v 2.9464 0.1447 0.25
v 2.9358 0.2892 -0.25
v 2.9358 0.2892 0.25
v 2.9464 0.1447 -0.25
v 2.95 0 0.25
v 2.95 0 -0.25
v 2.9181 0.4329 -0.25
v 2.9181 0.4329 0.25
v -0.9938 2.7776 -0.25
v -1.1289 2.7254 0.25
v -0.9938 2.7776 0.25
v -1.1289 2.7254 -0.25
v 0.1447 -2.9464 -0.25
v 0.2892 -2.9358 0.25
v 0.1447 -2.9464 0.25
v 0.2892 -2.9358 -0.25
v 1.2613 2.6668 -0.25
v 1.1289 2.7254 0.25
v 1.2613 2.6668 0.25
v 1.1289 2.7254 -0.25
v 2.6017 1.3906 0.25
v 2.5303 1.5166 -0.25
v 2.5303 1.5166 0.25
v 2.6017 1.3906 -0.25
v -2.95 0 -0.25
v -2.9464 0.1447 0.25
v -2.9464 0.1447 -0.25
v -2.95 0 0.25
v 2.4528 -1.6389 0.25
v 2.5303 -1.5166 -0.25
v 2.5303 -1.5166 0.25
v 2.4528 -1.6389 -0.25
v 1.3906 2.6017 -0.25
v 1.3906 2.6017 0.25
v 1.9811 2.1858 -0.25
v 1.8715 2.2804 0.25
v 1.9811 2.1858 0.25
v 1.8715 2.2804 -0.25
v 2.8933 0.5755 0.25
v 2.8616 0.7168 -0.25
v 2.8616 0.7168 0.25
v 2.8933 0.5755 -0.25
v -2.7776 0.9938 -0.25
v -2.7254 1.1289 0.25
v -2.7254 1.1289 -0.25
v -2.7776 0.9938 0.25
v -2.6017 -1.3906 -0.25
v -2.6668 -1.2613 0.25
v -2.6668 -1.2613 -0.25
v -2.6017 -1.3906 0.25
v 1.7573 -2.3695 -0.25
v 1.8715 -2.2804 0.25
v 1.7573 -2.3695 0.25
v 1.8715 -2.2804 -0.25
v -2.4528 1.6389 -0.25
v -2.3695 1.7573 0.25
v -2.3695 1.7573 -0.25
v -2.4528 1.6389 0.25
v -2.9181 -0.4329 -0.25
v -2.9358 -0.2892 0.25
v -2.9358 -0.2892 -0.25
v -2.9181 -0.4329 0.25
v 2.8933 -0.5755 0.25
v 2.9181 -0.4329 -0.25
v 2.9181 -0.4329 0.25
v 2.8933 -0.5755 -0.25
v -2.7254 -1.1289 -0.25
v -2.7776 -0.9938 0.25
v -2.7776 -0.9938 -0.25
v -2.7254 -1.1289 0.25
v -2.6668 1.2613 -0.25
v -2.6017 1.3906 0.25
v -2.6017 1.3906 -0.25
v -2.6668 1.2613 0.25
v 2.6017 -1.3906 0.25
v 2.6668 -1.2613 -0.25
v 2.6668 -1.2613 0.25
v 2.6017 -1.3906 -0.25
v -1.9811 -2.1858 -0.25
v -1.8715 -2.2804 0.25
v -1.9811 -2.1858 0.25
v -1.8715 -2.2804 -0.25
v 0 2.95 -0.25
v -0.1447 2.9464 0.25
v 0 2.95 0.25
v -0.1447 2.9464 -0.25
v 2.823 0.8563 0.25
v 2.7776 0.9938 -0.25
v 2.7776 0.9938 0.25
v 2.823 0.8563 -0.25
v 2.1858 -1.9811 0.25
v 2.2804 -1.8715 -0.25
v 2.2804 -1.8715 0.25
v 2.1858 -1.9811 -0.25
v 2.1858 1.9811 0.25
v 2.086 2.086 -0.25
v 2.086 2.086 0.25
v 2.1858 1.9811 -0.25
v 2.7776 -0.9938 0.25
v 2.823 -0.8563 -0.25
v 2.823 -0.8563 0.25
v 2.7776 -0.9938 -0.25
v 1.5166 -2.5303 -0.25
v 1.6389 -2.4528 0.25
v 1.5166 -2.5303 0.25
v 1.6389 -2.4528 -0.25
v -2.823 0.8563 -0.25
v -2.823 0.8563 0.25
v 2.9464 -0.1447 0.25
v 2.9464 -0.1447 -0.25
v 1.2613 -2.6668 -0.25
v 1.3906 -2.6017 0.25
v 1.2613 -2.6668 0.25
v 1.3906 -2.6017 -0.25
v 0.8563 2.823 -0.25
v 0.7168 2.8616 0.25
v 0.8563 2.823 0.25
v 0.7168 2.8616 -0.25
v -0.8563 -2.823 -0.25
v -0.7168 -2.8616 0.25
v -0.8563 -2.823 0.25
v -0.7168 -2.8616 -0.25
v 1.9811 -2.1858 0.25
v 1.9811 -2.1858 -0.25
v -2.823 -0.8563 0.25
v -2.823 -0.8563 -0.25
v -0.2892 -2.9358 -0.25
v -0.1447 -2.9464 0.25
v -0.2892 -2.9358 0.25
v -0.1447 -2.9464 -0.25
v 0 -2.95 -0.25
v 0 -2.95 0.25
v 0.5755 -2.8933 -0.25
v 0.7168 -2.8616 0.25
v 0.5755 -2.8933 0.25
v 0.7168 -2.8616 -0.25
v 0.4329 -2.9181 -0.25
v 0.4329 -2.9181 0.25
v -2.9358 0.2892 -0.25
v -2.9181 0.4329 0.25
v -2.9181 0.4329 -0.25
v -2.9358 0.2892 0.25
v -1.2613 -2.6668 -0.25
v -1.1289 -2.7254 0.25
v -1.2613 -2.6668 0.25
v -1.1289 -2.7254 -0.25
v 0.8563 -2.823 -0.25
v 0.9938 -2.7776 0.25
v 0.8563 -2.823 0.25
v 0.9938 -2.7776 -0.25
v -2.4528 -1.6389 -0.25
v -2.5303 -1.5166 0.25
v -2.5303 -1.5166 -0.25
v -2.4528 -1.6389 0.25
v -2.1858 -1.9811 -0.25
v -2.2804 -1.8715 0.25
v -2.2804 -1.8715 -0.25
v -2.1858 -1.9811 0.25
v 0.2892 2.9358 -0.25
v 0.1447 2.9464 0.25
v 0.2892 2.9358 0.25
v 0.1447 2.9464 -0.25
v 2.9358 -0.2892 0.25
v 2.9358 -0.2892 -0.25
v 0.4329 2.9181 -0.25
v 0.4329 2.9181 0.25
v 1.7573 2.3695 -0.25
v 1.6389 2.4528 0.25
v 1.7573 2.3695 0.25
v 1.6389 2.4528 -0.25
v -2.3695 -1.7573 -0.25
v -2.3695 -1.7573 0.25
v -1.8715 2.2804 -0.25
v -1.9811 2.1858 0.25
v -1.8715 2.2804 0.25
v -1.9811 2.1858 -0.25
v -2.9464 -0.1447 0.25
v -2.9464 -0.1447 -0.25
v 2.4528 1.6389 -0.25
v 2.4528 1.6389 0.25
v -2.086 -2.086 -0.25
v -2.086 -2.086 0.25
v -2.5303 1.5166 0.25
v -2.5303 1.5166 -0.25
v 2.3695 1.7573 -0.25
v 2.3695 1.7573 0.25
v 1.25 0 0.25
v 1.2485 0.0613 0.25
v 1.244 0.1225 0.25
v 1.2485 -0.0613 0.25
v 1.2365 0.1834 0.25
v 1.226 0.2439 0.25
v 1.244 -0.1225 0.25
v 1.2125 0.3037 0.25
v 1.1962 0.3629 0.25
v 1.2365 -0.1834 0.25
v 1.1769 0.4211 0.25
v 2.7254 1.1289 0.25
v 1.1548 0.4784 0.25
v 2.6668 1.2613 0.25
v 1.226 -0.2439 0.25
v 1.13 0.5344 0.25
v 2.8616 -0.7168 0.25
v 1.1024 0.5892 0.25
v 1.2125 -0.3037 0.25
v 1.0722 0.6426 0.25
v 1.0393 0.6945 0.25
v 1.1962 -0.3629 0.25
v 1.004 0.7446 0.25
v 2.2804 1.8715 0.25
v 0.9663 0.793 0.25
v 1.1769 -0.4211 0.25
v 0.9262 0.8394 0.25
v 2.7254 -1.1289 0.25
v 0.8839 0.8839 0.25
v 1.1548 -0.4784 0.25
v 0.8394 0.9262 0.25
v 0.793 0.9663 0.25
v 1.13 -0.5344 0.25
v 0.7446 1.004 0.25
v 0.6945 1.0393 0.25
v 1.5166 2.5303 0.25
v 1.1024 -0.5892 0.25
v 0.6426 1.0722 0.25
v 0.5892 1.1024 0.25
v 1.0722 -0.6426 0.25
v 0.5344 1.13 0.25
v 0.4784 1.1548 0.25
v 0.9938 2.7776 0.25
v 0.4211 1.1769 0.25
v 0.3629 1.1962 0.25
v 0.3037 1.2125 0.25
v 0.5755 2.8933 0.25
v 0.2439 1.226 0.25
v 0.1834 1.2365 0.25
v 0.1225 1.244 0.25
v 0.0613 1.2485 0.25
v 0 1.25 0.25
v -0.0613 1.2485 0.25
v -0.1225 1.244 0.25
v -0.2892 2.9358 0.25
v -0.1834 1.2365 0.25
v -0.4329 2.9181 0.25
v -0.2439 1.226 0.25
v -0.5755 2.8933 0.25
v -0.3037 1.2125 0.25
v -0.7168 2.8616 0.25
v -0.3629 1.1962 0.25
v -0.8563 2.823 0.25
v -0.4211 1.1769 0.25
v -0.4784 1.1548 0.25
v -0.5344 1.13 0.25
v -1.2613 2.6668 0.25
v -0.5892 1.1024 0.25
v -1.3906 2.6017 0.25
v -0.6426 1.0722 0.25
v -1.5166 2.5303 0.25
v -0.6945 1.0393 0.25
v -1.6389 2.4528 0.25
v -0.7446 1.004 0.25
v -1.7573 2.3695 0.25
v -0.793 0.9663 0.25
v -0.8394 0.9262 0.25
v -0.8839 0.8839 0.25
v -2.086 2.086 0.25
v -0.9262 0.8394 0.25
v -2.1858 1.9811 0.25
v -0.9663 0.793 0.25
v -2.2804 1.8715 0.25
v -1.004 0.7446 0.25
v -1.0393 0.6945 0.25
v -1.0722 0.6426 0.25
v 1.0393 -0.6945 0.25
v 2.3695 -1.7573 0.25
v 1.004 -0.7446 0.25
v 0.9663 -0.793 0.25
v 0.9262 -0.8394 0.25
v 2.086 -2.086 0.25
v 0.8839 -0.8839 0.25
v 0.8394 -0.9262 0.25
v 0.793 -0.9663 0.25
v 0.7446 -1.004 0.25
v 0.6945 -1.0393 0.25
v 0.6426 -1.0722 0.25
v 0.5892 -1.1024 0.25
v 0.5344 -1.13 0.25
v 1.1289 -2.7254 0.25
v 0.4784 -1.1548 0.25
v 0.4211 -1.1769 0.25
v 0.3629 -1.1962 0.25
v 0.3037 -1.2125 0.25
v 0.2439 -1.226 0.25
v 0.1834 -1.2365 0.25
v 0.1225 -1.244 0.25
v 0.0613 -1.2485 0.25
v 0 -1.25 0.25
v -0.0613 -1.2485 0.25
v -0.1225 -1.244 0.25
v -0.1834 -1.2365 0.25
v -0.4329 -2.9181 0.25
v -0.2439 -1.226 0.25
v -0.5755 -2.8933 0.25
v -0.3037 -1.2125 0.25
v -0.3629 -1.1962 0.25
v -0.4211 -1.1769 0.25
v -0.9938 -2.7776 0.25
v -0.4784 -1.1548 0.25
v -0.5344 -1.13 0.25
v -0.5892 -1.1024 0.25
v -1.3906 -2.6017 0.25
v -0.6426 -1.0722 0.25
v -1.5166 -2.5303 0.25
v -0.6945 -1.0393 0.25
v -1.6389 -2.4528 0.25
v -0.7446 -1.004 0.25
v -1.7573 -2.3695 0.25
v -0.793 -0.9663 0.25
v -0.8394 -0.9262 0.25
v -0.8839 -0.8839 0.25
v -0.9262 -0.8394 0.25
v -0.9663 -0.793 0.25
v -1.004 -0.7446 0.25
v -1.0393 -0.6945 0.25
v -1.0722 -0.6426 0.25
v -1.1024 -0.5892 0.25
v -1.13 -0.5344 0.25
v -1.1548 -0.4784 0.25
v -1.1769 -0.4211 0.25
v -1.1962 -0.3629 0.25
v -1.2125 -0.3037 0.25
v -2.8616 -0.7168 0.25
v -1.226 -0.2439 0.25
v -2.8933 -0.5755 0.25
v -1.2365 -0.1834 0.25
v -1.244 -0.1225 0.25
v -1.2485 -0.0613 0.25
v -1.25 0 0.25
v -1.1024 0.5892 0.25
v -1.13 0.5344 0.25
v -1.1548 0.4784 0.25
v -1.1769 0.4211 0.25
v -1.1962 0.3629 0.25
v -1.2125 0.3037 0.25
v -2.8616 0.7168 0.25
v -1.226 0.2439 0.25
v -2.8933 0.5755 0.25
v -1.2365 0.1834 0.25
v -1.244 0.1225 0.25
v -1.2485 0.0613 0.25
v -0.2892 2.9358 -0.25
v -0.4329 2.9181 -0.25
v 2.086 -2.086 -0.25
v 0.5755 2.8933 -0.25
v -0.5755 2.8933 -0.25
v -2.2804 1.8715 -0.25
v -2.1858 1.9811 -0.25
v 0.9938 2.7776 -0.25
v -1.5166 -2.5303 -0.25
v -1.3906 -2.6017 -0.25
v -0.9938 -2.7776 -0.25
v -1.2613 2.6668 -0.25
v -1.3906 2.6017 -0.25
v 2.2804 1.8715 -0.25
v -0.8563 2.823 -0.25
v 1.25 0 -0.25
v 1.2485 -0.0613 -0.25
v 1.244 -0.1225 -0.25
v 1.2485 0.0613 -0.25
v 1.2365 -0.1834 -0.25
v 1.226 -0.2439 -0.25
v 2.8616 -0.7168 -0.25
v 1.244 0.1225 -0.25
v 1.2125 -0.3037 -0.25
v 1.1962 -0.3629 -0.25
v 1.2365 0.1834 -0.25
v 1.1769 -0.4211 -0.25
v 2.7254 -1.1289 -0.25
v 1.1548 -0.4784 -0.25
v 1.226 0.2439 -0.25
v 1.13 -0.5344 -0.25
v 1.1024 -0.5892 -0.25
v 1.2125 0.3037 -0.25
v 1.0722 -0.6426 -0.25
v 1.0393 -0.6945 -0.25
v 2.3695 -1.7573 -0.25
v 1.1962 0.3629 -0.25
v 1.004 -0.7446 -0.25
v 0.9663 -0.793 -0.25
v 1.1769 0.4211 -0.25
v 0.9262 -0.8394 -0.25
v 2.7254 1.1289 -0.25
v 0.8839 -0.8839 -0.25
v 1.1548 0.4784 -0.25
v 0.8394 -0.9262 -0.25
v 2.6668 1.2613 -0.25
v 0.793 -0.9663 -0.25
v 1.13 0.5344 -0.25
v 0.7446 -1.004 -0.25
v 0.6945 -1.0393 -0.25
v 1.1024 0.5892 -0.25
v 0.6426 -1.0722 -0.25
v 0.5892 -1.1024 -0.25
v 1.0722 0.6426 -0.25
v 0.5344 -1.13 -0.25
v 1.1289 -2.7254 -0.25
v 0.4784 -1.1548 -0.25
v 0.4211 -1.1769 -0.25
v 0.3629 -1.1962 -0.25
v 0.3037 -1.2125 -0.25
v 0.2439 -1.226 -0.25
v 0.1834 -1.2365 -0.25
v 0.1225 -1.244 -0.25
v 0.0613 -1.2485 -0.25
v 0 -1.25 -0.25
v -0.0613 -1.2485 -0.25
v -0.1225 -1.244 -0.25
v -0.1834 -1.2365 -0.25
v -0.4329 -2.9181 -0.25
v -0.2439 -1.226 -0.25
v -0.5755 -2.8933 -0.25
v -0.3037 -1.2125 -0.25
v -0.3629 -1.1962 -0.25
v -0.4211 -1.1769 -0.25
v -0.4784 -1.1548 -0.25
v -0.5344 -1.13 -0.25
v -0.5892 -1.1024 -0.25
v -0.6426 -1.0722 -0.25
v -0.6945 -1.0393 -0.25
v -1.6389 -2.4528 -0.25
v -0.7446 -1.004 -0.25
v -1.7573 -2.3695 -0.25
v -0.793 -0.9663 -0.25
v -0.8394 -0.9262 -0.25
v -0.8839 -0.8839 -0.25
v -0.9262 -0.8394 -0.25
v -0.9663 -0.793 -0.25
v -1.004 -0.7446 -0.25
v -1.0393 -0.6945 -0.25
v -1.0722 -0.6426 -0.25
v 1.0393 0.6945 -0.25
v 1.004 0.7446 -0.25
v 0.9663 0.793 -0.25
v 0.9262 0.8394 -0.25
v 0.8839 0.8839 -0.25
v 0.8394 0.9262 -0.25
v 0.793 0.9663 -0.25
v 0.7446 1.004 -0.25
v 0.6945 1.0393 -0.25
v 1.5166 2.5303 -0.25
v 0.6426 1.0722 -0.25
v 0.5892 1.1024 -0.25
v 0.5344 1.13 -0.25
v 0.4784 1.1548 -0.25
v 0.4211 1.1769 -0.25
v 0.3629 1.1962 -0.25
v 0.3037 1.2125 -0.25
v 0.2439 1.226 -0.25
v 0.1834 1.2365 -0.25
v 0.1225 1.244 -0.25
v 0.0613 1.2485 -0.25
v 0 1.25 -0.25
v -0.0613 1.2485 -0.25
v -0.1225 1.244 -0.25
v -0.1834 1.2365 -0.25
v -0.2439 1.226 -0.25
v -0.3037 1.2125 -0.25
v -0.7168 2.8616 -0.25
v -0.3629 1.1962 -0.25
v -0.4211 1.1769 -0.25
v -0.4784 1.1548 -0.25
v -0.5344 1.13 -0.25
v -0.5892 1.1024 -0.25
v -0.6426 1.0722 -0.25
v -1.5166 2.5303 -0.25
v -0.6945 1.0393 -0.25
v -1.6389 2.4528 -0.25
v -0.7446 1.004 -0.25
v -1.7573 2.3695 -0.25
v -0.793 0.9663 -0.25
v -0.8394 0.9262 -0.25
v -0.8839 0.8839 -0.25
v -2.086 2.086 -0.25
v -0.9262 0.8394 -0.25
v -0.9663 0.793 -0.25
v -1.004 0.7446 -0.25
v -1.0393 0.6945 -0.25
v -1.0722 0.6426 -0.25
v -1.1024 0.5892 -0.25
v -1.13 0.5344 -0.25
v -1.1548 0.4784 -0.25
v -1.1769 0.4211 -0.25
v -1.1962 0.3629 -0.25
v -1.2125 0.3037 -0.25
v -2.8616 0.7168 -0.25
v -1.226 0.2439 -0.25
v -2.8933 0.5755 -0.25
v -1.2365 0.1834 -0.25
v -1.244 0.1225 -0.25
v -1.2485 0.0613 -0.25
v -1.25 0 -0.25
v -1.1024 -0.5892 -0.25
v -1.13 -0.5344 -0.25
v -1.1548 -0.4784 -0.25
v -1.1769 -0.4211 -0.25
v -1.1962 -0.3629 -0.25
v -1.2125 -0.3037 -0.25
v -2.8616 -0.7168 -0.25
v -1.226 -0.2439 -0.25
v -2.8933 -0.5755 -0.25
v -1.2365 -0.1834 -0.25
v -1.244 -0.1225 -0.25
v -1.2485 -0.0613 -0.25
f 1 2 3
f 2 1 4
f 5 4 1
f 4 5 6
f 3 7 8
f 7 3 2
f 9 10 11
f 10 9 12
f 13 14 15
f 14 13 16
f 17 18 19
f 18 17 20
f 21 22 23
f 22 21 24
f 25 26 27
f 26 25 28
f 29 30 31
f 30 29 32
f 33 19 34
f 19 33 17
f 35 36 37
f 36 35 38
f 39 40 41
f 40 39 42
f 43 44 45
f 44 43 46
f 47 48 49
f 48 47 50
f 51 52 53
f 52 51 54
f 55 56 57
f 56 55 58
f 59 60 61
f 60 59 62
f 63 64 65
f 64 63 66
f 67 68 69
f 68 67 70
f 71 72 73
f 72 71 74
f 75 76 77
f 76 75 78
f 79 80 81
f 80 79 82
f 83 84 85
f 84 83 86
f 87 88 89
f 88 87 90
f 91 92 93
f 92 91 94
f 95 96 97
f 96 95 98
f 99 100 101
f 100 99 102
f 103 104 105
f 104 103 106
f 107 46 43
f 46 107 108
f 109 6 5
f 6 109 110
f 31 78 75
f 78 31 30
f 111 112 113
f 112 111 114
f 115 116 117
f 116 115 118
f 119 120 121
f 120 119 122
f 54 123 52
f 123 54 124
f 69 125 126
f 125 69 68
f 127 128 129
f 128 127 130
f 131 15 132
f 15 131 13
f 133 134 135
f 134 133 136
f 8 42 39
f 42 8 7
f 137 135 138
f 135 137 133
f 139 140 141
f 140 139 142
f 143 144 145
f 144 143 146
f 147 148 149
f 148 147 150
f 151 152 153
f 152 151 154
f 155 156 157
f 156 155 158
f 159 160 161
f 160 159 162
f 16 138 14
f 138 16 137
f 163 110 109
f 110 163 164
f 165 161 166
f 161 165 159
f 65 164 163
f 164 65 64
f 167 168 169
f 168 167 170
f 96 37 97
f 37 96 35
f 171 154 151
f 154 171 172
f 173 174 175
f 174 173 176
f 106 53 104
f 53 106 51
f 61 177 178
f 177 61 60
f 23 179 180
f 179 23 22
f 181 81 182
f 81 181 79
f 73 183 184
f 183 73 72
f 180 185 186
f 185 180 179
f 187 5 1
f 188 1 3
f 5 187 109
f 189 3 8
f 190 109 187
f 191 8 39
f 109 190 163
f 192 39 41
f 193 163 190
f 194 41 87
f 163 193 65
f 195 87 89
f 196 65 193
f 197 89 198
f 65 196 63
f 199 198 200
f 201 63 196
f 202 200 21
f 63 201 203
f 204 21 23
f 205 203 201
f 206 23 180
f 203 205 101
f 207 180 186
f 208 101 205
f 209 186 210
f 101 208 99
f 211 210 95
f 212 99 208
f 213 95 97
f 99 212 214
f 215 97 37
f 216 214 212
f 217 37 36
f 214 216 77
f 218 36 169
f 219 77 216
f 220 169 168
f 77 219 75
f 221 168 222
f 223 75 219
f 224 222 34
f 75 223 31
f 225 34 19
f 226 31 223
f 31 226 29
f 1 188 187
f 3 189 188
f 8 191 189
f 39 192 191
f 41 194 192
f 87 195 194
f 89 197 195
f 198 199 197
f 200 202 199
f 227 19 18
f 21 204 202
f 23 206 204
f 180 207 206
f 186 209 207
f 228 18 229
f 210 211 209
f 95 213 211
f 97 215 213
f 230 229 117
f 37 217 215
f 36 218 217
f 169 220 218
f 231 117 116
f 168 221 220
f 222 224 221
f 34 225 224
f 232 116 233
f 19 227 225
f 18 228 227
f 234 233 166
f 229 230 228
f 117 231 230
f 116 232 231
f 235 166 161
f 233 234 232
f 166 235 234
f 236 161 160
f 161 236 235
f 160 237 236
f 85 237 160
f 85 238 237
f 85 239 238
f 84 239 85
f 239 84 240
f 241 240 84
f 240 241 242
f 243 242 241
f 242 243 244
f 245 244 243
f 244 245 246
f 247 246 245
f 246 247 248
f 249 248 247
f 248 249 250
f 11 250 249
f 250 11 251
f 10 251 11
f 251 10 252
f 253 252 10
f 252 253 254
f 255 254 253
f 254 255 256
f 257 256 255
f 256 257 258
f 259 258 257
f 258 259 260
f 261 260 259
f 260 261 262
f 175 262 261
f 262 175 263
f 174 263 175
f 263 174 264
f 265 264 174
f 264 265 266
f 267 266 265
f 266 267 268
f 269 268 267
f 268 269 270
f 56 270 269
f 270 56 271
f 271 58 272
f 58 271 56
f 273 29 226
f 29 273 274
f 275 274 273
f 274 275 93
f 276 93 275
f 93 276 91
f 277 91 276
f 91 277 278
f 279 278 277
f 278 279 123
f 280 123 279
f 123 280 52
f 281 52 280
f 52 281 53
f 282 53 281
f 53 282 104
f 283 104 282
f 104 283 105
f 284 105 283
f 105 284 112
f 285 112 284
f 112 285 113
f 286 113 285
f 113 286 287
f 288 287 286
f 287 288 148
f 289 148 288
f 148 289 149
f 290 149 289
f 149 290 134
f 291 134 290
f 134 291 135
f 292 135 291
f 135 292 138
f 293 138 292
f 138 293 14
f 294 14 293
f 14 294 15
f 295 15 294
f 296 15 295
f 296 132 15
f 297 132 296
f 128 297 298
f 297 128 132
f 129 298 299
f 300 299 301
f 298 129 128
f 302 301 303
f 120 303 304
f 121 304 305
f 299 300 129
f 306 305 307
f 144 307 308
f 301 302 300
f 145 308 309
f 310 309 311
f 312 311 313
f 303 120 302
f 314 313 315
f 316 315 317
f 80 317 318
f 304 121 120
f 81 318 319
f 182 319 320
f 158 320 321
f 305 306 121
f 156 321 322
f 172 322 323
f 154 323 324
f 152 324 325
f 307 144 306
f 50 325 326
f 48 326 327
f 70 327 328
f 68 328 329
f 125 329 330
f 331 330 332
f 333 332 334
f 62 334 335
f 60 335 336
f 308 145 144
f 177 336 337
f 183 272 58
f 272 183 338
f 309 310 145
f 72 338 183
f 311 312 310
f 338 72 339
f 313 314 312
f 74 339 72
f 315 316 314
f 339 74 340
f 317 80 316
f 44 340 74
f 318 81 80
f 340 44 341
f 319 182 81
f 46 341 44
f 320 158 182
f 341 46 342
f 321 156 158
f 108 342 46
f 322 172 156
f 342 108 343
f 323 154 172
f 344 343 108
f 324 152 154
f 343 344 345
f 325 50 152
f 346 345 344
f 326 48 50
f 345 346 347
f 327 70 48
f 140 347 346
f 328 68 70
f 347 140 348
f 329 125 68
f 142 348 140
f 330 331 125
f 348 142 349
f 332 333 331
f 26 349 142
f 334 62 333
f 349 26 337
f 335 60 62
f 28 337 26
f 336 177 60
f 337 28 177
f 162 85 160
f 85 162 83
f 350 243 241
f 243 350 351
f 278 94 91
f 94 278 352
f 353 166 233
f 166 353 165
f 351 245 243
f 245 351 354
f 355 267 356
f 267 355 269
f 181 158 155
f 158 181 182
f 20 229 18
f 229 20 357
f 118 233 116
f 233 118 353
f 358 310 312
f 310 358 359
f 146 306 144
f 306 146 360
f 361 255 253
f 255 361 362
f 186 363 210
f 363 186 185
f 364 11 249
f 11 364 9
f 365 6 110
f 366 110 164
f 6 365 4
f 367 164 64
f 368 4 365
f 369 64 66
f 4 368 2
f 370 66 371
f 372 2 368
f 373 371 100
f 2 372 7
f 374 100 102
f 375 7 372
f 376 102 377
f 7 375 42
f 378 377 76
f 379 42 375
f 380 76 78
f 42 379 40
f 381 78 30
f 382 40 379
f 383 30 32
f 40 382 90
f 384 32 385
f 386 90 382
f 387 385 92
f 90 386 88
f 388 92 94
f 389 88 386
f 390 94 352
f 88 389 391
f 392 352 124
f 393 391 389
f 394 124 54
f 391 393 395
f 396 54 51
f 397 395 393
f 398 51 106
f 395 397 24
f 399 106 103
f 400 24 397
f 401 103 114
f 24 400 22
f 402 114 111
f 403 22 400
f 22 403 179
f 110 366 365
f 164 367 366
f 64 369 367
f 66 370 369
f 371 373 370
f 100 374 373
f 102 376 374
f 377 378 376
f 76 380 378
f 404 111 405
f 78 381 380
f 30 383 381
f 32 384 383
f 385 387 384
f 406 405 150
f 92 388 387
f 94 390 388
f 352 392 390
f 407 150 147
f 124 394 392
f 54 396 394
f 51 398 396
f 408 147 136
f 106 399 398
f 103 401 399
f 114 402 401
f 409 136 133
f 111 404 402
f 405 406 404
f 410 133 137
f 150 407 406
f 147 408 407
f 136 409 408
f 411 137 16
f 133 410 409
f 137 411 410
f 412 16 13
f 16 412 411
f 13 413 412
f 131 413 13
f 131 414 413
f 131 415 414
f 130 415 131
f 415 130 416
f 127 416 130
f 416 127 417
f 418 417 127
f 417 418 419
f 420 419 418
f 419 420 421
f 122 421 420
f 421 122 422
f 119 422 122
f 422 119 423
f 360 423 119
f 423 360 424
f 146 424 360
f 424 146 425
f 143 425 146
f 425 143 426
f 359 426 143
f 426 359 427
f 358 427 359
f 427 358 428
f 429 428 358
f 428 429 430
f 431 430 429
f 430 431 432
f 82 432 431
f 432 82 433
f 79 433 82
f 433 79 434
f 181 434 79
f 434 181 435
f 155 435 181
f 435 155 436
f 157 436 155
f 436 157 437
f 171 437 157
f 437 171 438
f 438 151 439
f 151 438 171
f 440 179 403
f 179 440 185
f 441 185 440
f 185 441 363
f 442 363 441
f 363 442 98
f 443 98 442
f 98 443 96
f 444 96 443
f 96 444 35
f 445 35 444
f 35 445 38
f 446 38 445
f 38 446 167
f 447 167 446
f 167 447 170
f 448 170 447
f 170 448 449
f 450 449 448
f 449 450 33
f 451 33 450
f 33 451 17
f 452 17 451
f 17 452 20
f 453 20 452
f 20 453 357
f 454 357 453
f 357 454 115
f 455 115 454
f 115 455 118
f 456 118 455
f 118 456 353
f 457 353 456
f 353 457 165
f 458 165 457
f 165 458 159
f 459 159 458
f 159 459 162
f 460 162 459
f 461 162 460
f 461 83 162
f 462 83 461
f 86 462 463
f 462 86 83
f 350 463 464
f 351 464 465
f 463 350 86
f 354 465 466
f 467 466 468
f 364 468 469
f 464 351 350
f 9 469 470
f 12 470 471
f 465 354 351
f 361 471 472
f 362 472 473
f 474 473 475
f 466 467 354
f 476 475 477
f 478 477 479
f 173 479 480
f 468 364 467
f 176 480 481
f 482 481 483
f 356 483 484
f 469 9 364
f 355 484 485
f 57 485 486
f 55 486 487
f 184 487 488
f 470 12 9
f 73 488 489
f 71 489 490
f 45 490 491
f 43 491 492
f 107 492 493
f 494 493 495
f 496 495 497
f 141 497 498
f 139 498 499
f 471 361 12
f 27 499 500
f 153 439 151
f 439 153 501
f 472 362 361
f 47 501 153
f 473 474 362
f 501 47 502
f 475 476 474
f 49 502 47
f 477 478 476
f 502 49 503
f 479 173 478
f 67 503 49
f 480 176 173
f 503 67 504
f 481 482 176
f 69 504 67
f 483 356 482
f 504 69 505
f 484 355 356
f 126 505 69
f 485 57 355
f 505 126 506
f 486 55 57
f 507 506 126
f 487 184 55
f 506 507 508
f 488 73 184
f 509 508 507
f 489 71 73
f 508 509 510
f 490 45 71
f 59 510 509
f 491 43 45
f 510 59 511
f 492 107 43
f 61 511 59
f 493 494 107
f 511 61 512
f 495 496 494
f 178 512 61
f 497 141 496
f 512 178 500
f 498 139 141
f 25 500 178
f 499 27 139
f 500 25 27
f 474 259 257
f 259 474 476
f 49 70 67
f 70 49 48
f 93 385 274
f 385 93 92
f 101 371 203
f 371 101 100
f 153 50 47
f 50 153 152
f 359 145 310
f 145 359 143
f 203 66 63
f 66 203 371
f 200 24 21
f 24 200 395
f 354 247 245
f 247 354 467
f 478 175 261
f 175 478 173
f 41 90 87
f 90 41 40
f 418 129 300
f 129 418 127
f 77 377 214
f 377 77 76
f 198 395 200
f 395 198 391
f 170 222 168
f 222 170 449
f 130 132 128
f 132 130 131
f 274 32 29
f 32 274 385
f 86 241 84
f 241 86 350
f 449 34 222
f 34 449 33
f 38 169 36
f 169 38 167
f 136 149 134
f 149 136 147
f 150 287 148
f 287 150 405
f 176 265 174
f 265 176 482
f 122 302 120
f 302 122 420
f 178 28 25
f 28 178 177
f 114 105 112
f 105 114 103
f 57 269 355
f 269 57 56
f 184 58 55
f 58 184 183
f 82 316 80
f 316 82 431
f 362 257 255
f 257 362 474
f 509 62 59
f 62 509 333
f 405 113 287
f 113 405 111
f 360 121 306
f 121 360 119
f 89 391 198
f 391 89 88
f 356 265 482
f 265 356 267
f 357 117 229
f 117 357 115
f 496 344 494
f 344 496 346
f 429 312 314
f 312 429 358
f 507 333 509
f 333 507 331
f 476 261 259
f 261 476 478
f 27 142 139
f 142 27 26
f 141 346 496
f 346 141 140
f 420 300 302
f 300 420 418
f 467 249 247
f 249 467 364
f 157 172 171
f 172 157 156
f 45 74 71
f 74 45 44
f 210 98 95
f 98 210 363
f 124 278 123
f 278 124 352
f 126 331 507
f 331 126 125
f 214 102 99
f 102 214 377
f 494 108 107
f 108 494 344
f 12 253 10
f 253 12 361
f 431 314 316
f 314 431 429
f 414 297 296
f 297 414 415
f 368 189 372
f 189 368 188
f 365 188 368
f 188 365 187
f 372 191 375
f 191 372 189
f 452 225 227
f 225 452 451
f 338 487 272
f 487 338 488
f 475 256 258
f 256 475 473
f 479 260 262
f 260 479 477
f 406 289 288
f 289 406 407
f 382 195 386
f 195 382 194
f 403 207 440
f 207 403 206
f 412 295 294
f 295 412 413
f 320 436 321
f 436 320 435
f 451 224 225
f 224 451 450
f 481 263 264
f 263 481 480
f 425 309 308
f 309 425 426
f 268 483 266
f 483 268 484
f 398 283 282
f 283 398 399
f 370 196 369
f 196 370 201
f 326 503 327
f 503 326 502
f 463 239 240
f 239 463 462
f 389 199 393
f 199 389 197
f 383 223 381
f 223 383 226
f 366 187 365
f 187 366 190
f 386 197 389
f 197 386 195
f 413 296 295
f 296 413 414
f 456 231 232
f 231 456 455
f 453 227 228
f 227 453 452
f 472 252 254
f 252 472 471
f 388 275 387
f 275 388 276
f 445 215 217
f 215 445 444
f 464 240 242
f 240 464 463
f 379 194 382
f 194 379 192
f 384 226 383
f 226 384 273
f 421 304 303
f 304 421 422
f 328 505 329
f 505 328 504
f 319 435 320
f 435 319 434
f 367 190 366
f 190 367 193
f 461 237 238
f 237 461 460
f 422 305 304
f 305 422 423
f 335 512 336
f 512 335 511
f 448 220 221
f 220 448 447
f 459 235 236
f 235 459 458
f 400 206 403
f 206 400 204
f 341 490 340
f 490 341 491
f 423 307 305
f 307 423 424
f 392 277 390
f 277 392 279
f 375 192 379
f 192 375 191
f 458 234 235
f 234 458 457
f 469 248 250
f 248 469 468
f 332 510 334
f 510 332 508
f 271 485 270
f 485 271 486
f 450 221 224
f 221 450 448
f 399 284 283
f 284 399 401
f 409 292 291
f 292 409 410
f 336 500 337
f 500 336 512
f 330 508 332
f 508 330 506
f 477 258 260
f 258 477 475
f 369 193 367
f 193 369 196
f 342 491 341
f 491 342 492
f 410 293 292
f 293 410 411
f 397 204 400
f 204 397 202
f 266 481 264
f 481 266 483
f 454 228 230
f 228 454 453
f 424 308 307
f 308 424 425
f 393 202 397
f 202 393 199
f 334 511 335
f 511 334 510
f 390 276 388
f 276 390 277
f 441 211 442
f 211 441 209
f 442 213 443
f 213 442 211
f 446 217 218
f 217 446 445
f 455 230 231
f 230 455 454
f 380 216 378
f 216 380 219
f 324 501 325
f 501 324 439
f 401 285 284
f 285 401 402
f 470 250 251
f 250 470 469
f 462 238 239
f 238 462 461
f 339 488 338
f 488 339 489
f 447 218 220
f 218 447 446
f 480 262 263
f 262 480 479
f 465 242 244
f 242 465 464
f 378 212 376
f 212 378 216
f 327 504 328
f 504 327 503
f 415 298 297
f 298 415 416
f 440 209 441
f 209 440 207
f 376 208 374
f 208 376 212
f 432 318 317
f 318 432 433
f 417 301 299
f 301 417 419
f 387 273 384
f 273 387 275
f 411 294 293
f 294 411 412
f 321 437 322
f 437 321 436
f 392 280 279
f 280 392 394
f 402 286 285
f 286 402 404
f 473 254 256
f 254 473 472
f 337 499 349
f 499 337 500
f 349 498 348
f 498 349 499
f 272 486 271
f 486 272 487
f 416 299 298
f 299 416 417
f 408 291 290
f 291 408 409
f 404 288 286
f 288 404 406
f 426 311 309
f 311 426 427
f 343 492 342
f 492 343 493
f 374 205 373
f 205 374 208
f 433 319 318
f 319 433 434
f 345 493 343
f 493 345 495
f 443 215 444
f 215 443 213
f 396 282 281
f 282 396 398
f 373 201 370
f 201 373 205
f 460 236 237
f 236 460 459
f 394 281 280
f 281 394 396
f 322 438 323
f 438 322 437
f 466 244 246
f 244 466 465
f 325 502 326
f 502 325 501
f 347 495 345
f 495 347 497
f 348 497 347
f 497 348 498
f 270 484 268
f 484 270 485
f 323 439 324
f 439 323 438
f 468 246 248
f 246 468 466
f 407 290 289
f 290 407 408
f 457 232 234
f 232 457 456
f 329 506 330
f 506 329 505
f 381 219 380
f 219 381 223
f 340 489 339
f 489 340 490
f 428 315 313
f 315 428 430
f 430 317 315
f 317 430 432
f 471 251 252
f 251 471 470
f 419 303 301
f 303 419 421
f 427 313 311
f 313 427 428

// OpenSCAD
// Flat washer: 2.5mm ID, 5.9mm OD, 0.5mm thickness

inner_diameter_mm = 2.5;   // through-hole diameter
outer_diameter_mm = 5.9;   // outside diameter
thickness_mm      = 0.5;   // washer thickness

// Extra height for clean boolean cut (formula-based, not arbitrary)
cut_extra_h = thickness_mm * 2;

$fn = 128;

module flat_washer(id, od, t) {
    difference() {
        cylinder(d=od, h=t, center=true);
        cylinder(d=id, h=t + cut_extra_h, center=true);
    }
}

flat_washer(inner_diameter_mm, outer_diameter_mm, thickness_mm);
